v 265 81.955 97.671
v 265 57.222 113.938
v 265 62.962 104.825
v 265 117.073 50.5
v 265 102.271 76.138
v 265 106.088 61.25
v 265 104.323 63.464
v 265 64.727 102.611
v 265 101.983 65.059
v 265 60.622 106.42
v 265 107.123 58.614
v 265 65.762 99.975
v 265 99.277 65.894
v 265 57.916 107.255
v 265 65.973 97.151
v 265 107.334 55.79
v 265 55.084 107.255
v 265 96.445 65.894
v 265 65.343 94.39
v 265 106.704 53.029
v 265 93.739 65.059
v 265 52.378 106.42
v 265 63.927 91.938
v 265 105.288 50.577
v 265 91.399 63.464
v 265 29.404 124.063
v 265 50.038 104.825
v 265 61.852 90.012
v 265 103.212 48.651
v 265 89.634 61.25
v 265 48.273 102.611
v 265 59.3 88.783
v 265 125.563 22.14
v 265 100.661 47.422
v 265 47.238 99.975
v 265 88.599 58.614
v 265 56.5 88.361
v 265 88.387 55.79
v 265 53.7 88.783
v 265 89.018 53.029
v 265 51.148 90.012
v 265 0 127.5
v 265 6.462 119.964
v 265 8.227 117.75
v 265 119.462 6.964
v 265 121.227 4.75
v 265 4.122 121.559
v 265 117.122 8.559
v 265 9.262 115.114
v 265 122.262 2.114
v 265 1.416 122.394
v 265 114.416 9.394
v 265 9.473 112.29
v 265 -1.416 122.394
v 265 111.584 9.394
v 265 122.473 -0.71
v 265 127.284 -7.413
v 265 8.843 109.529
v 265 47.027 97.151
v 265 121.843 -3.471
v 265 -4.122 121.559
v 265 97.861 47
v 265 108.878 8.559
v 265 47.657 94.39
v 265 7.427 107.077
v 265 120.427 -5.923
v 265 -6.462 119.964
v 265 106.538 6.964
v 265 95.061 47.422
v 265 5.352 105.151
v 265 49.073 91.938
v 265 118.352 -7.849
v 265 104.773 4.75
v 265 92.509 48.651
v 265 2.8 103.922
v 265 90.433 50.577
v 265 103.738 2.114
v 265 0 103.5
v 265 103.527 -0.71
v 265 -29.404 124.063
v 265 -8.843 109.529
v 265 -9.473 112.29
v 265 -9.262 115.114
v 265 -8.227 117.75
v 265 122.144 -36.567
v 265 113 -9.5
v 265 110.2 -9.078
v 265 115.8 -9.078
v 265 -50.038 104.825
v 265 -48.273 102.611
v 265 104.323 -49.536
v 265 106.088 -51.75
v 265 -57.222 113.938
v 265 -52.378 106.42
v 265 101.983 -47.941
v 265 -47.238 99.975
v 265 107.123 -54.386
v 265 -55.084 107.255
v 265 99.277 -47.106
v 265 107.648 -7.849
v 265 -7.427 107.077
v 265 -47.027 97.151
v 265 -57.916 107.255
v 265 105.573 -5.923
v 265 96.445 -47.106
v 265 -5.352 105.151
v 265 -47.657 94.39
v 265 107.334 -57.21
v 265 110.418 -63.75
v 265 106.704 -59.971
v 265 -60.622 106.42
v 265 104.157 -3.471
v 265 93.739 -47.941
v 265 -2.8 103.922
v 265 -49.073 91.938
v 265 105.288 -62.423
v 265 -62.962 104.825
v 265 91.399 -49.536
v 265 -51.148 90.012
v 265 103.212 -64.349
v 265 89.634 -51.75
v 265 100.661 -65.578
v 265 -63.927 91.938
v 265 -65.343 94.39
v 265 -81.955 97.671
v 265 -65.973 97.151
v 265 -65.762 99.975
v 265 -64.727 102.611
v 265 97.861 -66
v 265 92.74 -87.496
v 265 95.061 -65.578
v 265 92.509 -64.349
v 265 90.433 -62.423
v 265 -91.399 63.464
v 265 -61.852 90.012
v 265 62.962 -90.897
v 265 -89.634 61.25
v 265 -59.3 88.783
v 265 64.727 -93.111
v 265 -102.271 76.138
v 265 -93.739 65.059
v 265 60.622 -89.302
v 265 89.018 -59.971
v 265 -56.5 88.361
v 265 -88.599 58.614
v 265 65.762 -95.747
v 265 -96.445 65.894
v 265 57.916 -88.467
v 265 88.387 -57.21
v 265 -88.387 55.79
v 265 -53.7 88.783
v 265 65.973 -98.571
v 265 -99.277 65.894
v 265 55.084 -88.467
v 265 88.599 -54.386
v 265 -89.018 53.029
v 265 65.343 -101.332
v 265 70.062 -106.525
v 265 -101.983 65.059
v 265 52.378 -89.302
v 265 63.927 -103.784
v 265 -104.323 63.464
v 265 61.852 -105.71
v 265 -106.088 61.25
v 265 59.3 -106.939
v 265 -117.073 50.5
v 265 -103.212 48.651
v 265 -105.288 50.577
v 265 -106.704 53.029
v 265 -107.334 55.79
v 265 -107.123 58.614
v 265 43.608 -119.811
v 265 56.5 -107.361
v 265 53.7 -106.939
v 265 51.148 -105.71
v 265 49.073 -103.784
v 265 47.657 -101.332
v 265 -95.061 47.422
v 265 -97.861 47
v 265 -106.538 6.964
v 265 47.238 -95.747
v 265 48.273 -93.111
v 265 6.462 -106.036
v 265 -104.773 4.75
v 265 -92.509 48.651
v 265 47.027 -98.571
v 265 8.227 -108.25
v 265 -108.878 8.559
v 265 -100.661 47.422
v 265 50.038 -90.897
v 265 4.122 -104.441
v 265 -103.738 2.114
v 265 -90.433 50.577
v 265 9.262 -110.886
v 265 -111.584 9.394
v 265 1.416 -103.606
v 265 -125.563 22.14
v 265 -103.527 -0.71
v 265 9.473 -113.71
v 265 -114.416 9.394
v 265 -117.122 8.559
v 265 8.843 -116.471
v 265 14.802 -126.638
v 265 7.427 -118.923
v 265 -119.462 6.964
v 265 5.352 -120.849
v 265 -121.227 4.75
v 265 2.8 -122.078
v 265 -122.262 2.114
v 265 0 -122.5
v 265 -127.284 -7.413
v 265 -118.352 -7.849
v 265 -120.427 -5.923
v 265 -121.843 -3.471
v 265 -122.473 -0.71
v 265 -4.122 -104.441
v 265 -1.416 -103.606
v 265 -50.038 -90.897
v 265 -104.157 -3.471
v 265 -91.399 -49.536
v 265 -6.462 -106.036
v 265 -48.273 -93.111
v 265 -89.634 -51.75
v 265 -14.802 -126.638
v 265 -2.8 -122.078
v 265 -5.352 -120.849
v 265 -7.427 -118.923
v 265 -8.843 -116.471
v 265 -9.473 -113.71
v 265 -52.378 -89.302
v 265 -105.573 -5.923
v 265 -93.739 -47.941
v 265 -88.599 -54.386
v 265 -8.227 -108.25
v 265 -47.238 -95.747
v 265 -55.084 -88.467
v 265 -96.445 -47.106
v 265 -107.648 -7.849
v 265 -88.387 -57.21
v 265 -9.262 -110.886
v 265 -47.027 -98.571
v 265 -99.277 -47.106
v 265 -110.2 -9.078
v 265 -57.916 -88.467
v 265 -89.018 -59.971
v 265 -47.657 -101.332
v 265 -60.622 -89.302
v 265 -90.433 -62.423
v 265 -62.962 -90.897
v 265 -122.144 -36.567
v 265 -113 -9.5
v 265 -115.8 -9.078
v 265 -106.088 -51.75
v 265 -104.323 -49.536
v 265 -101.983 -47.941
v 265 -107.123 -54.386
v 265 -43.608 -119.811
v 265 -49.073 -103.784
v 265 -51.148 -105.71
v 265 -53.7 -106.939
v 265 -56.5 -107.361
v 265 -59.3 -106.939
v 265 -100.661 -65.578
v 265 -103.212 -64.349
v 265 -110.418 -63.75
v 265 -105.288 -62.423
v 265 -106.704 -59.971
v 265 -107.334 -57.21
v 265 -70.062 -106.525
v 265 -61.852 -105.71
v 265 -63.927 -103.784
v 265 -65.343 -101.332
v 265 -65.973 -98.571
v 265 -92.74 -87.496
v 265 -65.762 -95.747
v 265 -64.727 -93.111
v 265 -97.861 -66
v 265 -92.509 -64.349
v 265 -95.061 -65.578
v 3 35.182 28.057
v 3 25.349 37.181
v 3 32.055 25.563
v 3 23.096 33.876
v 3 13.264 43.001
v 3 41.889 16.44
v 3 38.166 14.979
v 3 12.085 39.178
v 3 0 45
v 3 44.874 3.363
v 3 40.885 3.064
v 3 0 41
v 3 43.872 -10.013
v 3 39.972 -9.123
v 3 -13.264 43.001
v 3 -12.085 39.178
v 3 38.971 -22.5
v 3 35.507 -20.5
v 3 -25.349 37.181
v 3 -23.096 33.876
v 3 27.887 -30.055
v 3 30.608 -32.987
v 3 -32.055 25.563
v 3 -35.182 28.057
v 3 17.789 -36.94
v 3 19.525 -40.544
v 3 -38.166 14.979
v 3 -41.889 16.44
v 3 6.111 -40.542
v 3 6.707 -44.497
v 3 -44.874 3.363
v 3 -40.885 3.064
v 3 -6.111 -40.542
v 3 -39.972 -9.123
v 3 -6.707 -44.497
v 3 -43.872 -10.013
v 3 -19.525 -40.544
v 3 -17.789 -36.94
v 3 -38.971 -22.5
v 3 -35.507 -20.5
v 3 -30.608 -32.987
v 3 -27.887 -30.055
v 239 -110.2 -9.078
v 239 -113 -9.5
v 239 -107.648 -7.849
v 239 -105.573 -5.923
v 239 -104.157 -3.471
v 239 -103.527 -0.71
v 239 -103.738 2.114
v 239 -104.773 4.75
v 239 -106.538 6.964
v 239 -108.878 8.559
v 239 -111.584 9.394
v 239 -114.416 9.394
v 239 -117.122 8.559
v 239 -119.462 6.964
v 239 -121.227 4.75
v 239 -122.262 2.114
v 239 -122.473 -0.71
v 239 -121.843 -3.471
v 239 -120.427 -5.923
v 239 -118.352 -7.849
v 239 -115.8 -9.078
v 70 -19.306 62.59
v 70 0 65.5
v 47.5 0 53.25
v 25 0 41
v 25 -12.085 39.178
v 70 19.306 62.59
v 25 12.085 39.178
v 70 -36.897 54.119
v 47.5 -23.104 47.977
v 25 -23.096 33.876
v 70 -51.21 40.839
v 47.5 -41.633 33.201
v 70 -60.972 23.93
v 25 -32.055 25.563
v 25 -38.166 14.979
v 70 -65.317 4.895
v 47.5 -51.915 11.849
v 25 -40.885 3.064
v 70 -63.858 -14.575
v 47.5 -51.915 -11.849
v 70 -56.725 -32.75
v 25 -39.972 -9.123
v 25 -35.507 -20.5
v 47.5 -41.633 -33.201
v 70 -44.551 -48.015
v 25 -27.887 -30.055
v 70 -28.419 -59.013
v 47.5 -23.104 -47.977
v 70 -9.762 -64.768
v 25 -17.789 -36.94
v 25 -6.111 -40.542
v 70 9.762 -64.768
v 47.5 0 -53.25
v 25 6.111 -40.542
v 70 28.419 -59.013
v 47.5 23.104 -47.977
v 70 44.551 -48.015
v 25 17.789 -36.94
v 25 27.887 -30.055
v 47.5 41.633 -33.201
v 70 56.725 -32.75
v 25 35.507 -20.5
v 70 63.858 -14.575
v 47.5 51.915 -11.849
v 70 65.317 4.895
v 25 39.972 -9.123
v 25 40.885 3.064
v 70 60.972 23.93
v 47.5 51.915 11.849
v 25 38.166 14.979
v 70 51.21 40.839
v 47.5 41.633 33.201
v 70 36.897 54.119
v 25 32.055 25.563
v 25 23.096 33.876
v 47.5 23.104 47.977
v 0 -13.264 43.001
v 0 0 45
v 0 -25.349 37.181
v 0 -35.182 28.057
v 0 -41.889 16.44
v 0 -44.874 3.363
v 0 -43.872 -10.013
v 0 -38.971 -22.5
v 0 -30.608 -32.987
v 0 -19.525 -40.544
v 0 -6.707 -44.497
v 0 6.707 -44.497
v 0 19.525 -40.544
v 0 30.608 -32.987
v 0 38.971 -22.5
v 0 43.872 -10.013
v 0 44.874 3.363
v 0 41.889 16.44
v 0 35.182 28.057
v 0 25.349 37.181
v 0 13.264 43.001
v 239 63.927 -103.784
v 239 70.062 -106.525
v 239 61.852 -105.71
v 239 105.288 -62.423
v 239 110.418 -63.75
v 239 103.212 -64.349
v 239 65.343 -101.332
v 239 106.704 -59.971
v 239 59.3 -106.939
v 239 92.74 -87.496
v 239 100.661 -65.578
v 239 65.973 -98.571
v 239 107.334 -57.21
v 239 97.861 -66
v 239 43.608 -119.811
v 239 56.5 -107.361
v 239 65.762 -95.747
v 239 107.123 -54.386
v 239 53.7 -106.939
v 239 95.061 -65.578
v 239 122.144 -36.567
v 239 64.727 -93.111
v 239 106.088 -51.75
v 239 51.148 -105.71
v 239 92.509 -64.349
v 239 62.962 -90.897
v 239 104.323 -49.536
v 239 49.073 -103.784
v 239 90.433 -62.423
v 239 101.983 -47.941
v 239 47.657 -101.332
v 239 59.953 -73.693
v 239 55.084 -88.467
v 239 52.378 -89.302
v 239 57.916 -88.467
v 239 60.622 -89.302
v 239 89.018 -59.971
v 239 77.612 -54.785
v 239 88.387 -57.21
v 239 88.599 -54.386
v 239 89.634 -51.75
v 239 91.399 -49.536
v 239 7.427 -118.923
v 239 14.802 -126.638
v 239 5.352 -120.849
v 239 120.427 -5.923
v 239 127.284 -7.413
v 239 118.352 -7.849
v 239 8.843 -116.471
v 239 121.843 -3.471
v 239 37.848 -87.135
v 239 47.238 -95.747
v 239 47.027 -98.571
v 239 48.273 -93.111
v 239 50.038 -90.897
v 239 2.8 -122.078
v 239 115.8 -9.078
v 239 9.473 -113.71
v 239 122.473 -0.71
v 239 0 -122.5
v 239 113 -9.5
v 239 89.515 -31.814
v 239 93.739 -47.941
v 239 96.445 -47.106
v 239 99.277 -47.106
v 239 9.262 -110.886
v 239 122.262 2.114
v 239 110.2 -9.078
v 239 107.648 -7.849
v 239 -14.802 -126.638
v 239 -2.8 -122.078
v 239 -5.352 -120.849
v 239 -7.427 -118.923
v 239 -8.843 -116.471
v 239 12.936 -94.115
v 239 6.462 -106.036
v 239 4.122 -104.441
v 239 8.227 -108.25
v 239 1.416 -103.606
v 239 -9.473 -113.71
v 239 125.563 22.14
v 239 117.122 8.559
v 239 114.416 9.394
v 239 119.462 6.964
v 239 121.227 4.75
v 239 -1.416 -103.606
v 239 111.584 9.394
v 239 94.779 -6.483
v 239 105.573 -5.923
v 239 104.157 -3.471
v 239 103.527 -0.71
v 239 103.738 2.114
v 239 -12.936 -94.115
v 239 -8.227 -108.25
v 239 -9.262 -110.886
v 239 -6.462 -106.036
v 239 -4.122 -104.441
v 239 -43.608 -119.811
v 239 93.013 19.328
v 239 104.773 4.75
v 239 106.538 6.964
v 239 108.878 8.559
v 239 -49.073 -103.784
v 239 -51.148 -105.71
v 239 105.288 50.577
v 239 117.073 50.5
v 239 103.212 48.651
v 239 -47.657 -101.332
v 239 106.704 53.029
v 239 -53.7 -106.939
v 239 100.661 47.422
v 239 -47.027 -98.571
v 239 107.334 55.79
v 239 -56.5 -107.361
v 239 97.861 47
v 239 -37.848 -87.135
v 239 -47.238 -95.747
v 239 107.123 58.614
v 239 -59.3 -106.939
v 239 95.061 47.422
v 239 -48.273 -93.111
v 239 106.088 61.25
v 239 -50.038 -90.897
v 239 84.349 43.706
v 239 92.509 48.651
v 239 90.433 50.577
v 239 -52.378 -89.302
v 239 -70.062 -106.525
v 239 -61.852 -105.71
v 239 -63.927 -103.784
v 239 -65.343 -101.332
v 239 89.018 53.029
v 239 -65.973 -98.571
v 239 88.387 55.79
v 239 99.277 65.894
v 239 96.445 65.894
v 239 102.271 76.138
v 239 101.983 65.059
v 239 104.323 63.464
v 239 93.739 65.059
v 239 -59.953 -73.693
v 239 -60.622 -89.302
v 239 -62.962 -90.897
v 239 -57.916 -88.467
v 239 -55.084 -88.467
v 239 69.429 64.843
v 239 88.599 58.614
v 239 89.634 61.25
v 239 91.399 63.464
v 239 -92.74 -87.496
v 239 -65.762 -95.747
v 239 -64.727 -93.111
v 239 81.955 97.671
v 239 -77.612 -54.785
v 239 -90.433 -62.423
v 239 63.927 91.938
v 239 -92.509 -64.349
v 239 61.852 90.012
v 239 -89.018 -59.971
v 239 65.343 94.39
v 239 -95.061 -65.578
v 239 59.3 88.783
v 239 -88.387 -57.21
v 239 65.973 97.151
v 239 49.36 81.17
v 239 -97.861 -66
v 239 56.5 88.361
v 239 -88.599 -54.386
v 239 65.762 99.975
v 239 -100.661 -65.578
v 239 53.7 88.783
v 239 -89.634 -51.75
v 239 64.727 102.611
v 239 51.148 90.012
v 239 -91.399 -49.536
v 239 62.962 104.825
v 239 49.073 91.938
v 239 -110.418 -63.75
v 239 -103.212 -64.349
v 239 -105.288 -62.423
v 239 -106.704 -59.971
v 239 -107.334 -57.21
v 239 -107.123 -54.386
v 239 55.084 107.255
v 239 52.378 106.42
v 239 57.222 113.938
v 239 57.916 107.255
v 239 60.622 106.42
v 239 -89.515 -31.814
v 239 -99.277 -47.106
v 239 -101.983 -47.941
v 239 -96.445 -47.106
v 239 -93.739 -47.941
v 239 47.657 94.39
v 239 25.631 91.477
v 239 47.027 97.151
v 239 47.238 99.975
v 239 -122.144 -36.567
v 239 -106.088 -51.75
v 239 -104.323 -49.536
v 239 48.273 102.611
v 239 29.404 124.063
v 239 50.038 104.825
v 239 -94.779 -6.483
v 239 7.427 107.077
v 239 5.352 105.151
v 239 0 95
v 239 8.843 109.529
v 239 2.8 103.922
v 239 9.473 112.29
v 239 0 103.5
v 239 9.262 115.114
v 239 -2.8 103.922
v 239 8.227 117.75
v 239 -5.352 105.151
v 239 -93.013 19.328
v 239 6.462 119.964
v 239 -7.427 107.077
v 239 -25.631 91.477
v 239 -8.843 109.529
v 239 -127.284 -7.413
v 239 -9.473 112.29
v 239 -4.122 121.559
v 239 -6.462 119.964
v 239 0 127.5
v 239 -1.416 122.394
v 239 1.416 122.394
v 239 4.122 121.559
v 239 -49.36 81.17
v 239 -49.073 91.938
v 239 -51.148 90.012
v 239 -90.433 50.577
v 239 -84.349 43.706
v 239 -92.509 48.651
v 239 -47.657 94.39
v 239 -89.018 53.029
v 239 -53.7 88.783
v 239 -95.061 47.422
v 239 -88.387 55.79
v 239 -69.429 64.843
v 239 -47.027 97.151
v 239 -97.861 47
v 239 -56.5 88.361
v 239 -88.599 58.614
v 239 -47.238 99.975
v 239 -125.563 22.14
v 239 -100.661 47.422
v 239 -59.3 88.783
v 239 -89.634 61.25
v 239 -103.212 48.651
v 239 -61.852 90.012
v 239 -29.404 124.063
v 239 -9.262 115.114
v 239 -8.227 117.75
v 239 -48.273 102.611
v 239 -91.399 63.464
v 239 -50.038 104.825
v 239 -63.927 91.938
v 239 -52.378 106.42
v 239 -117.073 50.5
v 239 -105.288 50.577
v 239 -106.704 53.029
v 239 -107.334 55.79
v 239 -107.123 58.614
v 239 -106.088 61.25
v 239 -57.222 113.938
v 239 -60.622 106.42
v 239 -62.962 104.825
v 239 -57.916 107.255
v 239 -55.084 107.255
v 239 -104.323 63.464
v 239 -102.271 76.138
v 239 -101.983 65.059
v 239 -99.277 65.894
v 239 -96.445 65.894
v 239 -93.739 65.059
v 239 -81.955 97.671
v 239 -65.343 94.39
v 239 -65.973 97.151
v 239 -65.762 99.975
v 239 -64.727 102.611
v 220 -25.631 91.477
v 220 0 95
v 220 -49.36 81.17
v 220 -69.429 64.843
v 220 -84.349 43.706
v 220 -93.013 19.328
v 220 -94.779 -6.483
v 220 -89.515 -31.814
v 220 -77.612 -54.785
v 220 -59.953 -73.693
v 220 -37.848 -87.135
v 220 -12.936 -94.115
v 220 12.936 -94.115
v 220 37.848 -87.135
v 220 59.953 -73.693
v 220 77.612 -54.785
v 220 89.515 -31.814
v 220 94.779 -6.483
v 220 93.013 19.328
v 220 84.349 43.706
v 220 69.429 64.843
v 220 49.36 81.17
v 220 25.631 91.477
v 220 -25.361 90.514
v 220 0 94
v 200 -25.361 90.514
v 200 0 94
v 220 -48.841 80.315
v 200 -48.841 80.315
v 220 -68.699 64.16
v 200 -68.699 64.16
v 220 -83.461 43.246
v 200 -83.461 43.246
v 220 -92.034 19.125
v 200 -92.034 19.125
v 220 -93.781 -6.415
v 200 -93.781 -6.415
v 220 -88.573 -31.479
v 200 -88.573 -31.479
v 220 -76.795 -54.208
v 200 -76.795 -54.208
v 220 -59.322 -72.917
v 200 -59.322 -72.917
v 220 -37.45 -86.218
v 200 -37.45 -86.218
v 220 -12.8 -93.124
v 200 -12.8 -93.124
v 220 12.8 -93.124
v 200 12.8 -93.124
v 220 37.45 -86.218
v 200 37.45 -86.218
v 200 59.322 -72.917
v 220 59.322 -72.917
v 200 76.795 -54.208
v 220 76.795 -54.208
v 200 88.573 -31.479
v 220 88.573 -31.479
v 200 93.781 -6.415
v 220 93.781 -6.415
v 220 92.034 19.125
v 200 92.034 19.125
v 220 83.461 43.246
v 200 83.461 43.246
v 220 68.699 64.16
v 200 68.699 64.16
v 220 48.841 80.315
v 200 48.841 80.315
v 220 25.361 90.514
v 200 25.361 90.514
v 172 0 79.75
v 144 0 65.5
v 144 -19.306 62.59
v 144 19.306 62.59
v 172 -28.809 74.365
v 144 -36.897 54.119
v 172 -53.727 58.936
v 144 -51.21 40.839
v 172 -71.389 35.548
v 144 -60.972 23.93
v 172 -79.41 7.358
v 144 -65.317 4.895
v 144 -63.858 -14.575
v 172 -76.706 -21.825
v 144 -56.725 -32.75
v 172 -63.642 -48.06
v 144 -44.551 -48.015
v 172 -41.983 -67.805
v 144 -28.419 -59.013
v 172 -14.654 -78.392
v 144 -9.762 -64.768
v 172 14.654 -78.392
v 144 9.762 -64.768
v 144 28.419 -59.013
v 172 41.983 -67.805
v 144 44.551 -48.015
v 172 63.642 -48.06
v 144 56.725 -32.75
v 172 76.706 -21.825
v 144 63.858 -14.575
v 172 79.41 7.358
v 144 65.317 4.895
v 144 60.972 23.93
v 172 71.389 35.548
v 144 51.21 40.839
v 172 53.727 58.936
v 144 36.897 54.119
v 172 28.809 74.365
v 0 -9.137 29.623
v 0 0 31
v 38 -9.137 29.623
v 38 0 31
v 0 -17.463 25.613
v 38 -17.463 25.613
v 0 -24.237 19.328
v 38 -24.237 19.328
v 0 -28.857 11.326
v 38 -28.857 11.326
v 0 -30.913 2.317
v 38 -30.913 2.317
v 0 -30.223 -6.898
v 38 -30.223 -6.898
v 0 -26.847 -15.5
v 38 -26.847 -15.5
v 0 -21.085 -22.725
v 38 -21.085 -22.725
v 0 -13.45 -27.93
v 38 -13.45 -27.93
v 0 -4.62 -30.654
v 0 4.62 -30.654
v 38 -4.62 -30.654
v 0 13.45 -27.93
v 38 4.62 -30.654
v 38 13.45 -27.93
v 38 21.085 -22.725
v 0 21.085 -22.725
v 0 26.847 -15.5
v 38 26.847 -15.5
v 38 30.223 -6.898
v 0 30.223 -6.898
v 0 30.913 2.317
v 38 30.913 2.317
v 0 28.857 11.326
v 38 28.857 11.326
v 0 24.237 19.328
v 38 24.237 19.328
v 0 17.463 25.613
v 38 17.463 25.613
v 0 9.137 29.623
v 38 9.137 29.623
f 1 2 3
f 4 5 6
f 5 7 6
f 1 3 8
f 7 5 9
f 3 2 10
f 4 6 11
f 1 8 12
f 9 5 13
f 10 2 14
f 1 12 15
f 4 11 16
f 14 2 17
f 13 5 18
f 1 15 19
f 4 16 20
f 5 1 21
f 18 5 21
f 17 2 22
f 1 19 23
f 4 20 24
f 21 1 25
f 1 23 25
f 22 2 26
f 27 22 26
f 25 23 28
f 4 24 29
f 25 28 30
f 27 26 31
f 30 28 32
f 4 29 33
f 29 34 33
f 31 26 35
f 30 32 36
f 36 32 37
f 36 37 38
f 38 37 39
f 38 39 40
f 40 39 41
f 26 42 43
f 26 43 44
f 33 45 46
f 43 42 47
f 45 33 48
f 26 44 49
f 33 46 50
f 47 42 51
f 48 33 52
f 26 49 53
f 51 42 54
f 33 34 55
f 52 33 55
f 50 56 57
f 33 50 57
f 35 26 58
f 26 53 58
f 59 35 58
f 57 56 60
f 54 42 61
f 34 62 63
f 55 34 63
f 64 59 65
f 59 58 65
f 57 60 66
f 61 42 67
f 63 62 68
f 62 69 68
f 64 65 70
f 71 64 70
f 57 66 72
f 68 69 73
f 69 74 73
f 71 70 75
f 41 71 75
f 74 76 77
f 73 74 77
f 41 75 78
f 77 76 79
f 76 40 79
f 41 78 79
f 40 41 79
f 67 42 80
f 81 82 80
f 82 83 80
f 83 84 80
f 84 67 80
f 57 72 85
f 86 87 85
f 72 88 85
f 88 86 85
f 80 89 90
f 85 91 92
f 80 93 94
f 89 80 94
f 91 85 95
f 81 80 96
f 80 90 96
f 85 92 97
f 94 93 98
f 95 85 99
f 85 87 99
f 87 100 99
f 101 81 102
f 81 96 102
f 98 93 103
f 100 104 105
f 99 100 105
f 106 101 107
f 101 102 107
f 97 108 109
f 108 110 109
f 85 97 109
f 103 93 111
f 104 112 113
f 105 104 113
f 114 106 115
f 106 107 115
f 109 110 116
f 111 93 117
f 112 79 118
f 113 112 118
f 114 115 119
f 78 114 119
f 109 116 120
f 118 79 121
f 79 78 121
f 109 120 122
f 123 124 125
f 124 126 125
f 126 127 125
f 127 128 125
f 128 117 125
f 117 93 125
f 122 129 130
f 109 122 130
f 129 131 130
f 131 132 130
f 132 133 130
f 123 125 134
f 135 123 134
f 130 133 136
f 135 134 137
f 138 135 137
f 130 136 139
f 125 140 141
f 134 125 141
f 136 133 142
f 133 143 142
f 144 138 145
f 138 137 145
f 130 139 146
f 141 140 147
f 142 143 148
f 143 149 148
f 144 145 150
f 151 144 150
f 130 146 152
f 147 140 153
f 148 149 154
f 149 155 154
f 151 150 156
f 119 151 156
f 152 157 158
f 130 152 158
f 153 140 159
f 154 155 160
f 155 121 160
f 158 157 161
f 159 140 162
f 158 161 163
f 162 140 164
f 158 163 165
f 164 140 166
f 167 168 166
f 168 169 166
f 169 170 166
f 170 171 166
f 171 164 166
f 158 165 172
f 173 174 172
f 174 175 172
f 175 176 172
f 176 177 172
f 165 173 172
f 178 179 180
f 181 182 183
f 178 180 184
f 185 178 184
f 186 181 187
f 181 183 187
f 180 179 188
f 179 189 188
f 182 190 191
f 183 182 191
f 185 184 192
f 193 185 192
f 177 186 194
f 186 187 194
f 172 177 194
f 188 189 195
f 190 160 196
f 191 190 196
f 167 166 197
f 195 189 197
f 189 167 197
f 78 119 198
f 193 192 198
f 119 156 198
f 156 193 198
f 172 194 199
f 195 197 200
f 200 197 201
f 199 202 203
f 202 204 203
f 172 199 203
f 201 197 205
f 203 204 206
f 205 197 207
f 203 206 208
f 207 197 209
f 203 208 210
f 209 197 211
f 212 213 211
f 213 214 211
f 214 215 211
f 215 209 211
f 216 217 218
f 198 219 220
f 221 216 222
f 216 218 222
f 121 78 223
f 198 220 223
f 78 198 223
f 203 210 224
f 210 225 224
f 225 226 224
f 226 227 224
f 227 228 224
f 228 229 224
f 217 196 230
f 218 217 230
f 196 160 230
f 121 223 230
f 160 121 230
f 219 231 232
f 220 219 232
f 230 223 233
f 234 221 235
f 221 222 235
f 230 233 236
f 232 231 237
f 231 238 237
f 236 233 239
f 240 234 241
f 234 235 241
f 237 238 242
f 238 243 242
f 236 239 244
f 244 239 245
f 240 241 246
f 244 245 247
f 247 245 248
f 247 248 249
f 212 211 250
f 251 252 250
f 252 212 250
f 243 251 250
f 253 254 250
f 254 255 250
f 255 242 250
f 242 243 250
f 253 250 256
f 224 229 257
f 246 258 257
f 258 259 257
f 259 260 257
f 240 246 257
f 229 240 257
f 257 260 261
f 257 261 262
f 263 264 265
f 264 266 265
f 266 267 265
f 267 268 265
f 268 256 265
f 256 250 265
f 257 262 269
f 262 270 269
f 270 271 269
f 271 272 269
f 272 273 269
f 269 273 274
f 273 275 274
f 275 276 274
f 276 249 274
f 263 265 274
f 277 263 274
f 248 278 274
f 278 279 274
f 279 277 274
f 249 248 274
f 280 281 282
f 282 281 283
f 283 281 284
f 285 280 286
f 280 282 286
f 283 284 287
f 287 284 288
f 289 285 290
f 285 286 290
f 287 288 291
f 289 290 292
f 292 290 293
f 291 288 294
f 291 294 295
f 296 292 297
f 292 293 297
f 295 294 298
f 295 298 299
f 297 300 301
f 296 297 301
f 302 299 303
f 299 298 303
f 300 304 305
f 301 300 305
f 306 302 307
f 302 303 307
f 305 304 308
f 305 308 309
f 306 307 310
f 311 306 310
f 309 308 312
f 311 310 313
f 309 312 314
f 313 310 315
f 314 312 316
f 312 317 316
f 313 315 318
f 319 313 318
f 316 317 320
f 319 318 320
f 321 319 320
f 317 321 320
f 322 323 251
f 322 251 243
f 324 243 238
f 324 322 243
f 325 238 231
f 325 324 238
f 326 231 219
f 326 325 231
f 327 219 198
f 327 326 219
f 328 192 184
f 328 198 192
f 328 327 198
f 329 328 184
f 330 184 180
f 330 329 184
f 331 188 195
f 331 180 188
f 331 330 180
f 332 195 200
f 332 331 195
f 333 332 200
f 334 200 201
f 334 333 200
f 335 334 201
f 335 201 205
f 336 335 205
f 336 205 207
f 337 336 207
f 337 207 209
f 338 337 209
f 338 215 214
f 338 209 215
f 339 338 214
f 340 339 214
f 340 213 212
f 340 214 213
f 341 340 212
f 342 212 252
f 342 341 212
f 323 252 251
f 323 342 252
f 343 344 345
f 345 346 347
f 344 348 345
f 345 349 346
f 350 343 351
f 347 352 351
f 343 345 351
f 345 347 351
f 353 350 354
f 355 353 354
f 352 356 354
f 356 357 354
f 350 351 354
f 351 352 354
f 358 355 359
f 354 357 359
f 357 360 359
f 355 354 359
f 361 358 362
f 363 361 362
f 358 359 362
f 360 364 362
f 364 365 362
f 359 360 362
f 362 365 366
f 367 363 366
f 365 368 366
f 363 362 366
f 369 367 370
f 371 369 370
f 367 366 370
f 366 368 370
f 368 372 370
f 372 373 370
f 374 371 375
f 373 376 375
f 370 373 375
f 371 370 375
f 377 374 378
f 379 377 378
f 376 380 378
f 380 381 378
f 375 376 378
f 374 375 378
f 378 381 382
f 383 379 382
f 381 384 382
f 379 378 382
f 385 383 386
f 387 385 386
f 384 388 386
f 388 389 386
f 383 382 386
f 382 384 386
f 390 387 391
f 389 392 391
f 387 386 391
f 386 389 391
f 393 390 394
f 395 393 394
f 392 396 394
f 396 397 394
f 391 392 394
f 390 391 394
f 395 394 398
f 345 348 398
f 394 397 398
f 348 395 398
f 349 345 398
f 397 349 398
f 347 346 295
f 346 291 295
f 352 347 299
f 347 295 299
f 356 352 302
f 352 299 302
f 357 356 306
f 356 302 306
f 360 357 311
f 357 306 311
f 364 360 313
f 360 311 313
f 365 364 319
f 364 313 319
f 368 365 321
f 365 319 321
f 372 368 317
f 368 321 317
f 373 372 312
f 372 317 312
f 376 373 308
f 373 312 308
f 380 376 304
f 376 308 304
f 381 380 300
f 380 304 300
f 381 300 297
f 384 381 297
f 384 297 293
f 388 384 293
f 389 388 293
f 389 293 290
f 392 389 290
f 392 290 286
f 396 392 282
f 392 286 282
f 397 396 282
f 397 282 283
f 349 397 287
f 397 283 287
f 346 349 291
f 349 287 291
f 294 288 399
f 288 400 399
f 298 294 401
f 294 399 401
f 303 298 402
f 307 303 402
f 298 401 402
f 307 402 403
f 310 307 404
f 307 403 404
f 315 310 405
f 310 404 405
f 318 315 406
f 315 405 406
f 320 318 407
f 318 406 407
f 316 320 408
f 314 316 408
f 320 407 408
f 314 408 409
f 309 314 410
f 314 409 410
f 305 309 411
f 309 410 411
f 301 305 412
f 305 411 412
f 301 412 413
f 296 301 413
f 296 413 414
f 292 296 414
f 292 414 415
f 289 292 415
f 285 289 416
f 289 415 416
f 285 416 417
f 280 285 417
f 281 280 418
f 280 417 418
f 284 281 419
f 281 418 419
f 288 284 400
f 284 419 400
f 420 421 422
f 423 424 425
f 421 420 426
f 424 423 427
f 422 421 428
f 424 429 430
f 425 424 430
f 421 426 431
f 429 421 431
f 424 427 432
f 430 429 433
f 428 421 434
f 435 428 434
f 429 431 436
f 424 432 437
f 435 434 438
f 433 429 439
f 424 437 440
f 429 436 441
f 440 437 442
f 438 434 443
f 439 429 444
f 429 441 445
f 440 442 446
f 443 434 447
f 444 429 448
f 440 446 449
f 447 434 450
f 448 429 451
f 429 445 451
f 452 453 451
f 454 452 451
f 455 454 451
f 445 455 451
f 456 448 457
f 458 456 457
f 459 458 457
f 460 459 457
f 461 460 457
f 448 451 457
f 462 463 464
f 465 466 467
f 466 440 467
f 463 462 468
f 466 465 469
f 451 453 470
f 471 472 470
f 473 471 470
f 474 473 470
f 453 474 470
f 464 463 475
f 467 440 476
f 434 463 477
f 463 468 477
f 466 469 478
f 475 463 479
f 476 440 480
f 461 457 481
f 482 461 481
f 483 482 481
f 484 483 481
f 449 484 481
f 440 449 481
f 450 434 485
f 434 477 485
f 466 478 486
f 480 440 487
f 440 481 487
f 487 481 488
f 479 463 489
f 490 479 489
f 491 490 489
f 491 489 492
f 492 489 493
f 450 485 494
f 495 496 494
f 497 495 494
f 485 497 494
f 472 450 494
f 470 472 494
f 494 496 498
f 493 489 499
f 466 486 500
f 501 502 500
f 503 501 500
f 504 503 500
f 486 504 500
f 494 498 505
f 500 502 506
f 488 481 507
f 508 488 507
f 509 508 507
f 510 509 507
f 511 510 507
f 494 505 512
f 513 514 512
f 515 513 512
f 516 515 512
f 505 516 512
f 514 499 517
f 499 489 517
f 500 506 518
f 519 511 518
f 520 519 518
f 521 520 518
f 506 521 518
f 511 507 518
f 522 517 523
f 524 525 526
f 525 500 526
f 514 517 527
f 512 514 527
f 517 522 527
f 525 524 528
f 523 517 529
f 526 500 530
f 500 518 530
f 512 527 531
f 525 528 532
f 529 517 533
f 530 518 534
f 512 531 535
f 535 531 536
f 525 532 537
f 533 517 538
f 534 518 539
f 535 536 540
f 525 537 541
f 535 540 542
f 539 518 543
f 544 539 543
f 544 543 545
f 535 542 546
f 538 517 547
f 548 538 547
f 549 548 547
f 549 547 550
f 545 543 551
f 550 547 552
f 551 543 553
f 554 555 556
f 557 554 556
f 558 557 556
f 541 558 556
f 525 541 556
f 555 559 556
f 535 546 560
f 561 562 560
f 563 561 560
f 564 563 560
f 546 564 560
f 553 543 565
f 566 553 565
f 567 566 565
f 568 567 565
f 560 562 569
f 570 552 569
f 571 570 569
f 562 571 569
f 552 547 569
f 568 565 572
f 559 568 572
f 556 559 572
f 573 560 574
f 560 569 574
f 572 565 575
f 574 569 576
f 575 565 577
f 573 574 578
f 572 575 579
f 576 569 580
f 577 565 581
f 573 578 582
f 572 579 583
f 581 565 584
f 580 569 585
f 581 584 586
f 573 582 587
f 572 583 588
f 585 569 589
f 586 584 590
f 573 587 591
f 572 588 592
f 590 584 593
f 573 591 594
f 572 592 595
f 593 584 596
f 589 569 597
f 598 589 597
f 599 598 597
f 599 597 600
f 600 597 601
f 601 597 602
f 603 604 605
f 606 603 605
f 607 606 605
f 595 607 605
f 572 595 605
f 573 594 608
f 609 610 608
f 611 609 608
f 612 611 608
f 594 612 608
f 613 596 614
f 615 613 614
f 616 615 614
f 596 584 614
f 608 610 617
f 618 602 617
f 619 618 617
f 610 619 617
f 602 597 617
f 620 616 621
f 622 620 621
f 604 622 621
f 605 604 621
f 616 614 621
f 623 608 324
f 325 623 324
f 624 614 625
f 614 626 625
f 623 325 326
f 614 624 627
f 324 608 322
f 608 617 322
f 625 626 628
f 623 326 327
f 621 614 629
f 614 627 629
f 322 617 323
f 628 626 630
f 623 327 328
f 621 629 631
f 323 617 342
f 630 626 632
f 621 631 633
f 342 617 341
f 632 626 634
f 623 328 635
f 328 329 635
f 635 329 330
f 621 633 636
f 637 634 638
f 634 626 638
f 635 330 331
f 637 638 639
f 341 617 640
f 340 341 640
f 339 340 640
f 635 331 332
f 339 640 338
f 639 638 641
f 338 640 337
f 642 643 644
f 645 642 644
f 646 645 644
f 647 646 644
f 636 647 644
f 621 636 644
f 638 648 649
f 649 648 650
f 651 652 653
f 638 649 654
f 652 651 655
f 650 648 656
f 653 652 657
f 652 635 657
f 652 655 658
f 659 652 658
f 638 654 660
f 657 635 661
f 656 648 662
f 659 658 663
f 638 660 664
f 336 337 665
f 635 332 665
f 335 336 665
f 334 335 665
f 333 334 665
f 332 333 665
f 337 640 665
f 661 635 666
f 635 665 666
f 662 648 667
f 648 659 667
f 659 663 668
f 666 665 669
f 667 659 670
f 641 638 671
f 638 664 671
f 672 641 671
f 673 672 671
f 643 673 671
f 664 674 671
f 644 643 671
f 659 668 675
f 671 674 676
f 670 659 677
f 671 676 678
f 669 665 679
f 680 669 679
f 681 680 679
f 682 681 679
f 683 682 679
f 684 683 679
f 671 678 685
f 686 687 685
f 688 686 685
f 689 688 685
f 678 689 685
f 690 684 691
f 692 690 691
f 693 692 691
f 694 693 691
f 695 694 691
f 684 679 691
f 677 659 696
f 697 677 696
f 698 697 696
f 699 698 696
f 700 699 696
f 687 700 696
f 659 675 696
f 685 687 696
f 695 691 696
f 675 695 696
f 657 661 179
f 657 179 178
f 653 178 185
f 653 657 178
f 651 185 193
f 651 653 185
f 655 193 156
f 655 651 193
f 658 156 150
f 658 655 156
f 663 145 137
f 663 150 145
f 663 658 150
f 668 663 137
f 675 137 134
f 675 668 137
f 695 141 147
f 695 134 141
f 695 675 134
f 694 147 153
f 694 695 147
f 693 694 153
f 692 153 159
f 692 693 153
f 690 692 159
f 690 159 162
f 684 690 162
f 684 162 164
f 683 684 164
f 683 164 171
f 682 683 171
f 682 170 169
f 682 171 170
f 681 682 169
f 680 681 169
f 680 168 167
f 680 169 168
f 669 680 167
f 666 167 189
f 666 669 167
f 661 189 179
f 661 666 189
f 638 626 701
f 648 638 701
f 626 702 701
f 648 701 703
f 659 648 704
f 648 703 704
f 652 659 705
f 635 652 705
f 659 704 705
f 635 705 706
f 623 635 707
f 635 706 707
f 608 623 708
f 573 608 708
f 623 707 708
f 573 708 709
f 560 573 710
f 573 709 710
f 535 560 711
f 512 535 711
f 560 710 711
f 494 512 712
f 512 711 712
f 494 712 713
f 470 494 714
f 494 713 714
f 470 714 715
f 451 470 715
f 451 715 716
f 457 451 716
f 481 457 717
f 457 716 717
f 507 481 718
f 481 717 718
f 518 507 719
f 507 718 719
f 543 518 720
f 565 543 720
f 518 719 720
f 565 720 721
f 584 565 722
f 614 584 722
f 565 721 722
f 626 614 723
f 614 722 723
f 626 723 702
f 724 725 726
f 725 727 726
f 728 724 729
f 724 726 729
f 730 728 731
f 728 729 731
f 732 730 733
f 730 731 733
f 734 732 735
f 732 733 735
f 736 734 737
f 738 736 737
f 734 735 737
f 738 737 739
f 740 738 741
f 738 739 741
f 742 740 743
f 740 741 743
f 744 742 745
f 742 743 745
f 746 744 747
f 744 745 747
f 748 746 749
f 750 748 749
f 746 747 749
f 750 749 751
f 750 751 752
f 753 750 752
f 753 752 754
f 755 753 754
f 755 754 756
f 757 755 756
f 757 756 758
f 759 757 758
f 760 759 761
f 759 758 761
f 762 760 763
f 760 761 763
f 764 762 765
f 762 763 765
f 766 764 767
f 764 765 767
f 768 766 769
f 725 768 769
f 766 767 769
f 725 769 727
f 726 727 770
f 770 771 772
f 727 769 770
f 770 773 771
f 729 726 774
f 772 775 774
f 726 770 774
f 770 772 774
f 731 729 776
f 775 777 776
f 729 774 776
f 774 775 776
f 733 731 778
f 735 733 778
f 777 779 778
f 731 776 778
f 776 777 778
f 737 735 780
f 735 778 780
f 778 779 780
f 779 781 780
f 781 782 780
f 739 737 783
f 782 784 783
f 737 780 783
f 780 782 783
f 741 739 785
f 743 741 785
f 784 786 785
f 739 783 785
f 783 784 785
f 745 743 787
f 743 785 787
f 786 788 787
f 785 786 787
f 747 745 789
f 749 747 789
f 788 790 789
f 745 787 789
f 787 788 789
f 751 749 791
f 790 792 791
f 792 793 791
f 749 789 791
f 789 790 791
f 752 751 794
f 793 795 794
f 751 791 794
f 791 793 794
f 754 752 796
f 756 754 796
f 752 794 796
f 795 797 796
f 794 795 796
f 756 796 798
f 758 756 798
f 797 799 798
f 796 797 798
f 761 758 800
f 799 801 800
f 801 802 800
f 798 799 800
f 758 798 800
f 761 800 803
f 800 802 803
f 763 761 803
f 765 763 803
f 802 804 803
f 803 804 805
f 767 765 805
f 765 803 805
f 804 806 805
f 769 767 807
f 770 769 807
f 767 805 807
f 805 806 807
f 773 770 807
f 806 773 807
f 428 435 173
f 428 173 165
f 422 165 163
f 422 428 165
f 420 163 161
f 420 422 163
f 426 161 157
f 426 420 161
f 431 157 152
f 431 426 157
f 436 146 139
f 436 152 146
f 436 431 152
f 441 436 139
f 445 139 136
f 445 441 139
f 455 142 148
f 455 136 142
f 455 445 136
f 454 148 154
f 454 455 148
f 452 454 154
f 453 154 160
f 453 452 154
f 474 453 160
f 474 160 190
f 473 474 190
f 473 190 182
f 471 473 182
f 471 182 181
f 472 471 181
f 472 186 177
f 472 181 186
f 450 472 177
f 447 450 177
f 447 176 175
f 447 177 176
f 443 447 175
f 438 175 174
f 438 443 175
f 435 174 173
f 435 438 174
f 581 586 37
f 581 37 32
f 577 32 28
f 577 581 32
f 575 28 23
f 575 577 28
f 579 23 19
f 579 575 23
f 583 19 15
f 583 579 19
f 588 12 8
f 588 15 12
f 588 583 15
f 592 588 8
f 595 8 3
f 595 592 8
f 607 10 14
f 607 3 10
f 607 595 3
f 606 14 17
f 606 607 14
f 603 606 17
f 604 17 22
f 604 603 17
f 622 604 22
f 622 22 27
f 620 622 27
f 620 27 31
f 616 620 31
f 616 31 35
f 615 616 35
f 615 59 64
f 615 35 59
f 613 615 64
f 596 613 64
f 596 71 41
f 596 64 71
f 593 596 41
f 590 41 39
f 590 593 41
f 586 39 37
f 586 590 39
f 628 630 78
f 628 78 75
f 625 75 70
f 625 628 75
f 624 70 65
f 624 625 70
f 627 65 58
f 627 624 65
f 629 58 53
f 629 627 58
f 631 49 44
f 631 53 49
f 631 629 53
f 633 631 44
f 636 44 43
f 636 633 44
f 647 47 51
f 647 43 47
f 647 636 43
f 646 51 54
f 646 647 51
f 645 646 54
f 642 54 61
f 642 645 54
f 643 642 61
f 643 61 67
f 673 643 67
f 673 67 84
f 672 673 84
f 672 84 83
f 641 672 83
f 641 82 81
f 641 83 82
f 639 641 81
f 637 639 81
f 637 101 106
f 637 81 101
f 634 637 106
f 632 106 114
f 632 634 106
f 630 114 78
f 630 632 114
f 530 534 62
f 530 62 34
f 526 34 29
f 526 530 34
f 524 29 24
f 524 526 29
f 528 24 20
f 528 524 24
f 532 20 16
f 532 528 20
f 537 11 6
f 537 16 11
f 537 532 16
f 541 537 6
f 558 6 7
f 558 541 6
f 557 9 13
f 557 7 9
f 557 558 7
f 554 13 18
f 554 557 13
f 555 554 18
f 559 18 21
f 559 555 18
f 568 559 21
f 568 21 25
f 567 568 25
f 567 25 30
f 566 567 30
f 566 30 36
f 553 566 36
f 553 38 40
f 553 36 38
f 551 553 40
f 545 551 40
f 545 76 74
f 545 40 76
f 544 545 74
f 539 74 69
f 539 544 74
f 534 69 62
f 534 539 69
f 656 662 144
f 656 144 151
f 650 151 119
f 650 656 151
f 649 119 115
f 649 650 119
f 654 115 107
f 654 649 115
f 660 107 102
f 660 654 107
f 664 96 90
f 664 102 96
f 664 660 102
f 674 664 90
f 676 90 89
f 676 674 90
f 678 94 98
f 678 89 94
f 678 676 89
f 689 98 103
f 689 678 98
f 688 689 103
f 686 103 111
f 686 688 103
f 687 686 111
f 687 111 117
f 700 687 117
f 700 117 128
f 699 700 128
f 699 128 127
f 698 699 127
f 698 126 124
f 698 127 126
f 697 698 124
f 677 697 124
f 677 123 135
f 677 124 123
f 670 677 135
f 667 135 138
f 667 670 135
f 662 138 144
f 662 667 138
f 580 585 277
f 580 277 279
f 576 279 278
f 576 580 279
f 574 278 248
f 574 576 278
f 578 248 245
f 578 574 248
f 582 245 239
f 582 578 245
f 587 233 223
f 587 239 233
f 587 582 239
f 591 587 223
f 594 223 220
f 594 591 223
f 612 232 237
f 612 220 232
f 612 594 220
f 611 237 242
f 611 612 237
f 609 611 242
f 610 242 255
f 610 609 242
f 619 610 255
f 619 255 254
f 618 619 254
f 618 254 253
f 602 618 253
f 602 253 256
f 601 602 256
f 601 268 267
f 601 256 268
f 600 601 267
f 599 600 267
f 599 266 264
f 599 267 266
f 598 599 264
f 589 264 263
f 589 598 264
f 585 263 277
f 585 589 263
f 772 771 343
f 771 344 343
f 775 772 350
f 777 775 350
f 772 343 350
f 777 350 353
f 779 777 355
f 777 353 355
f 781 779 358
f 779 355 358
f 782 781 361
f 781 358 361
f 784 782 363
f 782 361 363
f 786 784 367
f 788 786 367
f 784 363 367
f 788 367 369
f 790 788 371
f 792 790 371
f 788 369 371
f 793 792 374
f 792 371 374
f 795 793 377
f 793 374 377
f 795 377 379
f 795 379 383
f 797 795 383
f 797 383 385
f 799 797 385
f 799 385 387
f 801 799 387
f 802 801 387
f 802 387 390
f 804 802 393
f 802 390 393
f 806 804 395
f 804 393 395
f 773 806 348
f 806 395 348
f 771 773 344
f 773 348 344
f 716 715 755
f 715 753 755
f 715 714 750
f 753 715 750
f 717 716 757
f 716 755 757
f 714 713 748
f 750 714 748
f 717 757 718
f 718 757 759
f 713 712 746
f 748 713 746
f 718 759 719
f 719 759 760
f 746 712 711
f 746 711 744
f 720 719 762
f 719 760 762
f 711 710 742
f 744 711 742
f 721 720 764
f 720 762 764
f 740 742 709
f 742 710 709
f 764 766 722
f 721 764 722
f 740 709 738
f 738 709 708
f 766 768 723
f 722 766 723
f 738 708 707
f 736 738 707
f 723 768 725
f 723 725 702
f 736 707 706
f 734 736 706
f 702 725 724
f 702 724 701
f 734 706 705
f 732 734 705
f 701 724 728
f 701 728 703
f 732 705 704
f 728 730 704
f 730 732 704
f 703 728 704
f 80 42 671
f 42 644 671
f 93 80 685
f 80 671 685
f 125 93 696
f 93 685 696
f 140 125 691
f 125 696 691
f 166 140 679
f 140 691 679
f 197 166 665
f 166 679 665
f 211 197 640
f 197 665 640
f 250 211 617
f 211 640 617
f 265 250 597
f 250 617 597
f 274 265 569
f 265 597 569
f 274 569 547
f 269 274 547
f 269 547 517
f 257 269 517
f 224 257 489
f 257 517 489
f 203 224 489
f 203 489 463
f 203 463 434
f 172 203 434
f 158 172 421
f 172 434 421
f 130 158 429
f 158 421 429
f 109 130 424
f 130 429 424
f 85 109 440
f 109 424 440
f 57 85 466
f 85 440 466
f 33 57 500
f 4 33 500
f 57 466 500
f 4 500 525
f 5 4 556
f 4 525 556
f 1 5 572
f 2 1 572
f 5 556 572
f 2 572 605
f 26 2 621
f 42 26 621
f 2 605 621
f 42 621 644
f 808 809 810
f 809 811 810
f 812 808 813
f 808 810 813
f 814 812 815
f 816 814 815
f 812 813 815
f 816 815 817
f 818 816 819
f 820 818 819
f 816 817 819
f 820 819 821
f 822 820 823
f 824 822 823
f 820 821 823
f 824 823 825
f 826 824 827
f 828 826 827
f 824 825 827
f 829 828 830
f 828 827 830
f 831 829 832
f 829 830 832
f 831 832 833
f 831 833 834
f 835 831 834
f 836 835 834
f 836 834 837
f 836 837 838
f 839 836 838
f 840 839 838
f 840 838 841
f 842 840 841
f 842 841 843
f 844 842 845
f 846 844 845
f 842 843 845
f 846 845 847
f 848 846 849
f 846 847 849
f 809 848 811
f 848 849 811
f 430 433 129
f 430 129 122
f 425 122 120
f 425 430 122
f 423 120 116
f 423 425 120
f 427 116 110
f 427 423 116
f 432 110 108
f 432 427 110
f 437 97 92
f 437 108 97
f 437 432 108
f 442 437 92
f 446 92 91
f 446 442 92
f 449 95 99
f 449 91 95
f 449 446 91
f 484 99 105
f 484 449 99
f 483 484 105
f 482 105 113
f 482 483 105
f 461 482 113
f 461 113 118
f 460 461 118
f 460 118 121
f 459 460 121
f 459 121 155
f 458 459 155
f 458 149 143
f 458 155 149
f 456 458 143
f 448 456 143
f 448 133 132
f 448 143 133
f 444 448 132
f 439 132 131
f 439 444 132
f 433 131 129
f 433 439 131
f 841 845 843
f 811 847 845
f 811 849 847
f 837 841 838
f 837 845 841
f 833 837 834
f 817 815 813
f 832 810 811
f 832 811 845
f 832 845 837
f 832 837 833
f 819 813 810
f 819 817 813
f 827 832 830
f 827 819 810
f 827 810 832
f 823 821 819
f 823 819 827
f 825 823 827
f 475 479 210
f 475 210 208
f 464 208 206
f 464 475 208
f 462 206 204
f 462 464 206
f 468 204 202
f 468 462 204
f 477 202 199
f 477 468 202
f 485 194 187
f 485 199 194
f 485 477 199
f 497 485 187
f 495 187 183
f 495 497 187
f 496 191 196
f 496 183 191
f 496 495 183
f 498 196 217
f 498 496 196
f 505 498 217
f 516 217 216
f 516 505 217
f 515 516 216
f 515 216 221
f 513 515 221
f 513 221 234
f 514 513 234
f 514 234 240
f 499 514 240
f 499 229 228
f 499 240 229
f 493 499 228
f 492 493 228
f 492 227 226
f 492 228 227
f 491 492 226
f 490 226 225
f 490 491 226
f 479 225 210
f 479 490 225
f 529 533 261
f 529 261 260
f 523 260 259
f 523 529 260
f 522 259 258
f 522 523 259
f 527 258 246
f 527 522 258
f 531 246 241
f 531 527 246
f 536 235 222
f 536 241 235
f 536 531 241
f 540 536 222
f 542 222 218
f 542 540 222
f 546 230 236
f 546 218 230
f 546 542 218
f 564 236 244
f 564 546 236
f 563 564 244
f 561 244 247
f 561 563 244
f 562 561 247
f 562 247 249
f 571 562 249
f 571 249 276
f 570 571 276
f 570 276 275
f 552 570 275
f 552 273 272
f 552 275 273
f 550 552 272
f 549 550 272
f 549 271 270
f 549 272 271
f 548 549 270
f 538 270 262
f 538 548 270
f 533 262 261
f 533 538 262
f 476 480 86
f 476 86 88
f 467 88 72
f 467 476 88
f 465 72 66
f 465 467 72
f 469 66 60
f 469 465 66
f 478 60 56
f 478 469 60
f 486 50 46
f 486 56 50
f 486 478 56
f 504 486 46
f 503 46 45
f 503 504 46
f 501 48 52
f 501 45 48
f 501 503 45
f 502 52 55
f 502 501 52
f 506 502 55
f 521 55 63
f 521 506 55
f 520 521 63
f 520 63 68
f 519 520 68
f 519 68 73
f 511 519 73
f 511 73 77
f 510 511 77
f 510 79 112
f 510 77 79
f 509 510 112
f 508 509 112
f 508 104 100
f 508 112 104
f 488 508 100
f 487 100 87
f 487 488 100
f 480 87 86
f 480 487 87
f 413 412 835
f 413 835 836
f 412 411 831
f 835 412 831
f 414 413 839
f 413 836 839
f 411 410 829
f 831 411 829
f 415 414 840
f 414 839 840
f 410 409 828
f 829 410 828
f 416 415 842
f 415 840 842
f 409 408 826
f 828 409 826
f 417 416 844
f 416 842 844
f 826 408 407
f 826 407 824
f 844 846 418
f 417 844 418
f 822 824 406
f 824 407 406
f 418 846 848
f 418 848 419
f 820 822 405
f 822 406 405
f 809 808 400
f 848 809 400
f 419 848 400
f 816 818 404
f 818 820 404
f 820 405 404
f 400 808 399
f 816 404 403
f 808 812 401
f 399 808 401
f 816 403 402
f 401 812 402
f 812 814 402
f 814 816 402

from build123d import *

# Parameters (mm, degrees)
SKETCH_2_W           = 38
SKETCH_2_H           = 31
SKETCH_3_R           = 9.5
CUT_EXTRUDE_1_DEPTH  = 321.526909947
SKETCH_4_R           = 9.5
CUT_EXTRUDE_2_DEPTH  = 321.526909947
SKETCH_5_R           = 9.5
CUT_EXTRUDE_3_DEPTH  = 321.526909947
SKETCH_6_R           = 9.5
CUT_EXTRUDE_4_DEPTH  = 321.526909947
SKETCH_7_R           = 9.5
CUT_EXTRUDE_5_DEPTH  = 321.526909947
SKETCH_8_R           = 9.5
CUT_EXTRUDE_6_DEPTH  = 321.526909947
SKETCH_9_R           = 9.5
CUT_EXTRUDE_7_DEPTH  = 321.526909947
SKETCH_10_R          = 9.5
CUT_EXTRUDE_8_DEPTH  = 321.526909947
SKETCH_11_R          = 9.5
CUT_EXTRUDE_9_DEPTH  = 321.526909947
SKETCH_12_R          = 9.5
CUT_EXTRUDE_10_DEPTH = 321.526909947
SKETCH_13_R          = 9.5
CUT_EXTRUDE_11_DEPTH = 321.526909947
SKETCH_14_R          = 9.5
CUT_EXTRUDE_12_DEPTH = 321.526909947


with BuildPart() as part:
    # Эскиз1 → Повернуть1 (revolve)
    with BuildSketch(Plane.XY, mode=Mode.PRIVATE) as revolve_1_sk:
        Polygon((0, 0), (265, 0), (265, 127.5), (239, 127.5), (239, 100), (239, 95), (220, 95), (220, 94), (200, 94), (144, 65.5), (70, 65.5), (25, 41), (3, 41), (3, 45), (0, 45), align=None)
    revolve(revolve_1_sk.sketch.rotate(Axis((0, 0, 0), (1, 0, 0)), 90), axis=Axis((0, 0, 0), (1, 0, 0)))

    # Эскиз2 → Вырез-Повернуть1 (revolve, cut)
    with BuildSketch(Plane.XY, mode=Mode.PRIVATE) as cut_revolve_1_sk:
        with Locations((19, 15.5)):
            Rectangle(SKETCH_2_W, SKETCH_2_H)
    revolve(cut_revolve_1_sk.sketch.rotate(Axis((0, 0, 0), (1, 0, 0)), 90), axis=Axis((0, 0, 0), (1, 0, 0)), mode=Mode.SUBTRACT)

    # Эскиз3 → Вырез-Вытянуть1 (cut, through all)
    with BuildSketch(Plane(origin=(0, 0, 0), x_dir=(0, 0, -1), z_dir=(1, 0, 0))):
        with Locations((0, 113)):
            Circle(SKETCH_3_R)
    extrude(amount=CUT_EXTRUDE_1_DEPTH, mode=Mode.SUBTRACT)

    # Эскиз4 → Вырез-Вытянуть2 (cut, through all)
    with BuildSketch(Plane(origin=(0, 0, 0), x_dir=(0, 0, -1), z_dir=(1, 0, 0))):
        with Locations((-56.5, 97.860870628)):
            Circle(SKETCH_4_R)
    extrude(amount=CUT_EXTRUDE_2_DEPTH, mode=Mode.SUBTRACT)

    # Эскиз5 → Вырез-Вытянуть3 (cut, through all)
    with BuildSketch(Plane(origin=(0, 0, 0), x_dir=(0, 0, -1), z_dir=(1, 0, 0))):
        with Locations((-97.860870628, 56.5)):
            Circle(SKETCH_5_R)
    extrude(amount=CUT_EXTRUDE_3_DEPTH, mode=Mode.SUBTRACT)

    # Эскиз6 → Вырез-Вытянуть4 (cut, through all)
    with BuildSketch(Plane(origin=(0, 0, 0), x_dir=(0, 0, -1), z_dir=(1, 0, 0))):
        with Locations((-113, 0)):
            Circle(SKETCH_6_R)
    extrude(amount=CUT_EXTRUDE_4_DEPTH, mode=Mode.SUBTRACT)

    # Эскиз7 → Вырез-Вытянуть5 (cut, through all)
    with BuildSketch(Plane(origin=(0, 0, 0), x_dir=(0, 0, -1), z_dir=(1, 0, 0))):
        with Locations((-97.860870628, -56.5)):
            Circle(SKETCH_7_R)
    extrude(amount=CUT_EXTRUDE_5_DEPTH, mode=Mode.SUBTRACT)

    # Эскиз8 → Вырез-Вытянуть6 (cut, through all)
    with BuildSketch(Plane(origin=(0, 0, 0), x_dir=(0, 0, -1), z_dir=(1, 0, 0))):
        with Locations((-56.5, -97.860870628)):
            Circle(SKETCH_8_R)
    extrude(amount=CUT_EXTRUDE_6_DEPTH, mode=Mode.SUBTRACT)

    # Эскиз9 → Вырез-Вытянуть7 (cut, through all)
    with BuildSketch(Plane(origin=(0, 0, 0), x_dir=(0, 0, -1), z_dir=(1, 0, 0))):
        with Locations((0, -113)):
            Circle(SKETCH_9_R)
    extrude(amount=CUT_EXTRUDE_7_DEPTH, mode=Mode.SUBTRACT)

    # Эскиз10 → Вырез-Вытянуть8 (cut, through all)
    with BuildSketch(Plane(origin=(0, 0, 0), x_dir=(0, 0, -1), z_dir=(1, 0, 0))):
        with Locations((56.5, -97.860870628)):
            Circle(SKETCH_10_R)
    extrude(amount=CUT_EXTRUDE_8_DEPTH, mode=Mode.SUBTRACT)

    # Эскиз11 → Вырез-Вытянуть9 (cut, through all)
    with BuildSketch(Plane(origin=(0, 0, 0), x_dir=(0, 0, -1), z_dir=(1, 0, 0))):
        with Locations((97.860870628, -56.5)):
            Circle(SKETCH_11_R)
    extrude(amount=CUT_EXTRUDE_9_DEPTH, mode=Mode.SUBTRACT)

    # Эскиз12 → Вырез-Вытянуть10 (cut, through all)
    with BuildSketch(Plane(origin=(0, 0, 0), x_dir=(0, 0, -1), z_dir=(1, 0, 0))):
        with Locations((113, 0)):
            Circle(SKETCH_12_R)
    extrude(amount=CUT_EXTRUDE_10_DEPTH, mode=Mode.SUBTRACT)

    # Эскиз13 → Вырез-Вытянуть11 (cut, through all)
    with BuildSketch(Plane(origin=(0, 0, 0), x_dir=(0, 0, -1), z_dir=(1, 0, 0))):
        with Locations((97.860870628, 56.5)):
            Circle(SKETCH_13_R)
    extrude(amount=CUT_EXTRUDE_11_DEPTH, mode=Mode.SUBTRACT)

    # Эскиз14 → Вырез-Вытянуть12 (cut, through all)
    with BuildSketch(Plane(origin=(0, 0, 0), x_dir=(0, 0, -1), z_dir=(1, 0, 0))):
        with Locations((56.5, 97.860870628)):
            Circle(SKETCH_14_R)
    extrude(amount=CUT_EXTRUDE_12_DEPTH, mode=Mode.SUBTRACT)


solid = part.part
